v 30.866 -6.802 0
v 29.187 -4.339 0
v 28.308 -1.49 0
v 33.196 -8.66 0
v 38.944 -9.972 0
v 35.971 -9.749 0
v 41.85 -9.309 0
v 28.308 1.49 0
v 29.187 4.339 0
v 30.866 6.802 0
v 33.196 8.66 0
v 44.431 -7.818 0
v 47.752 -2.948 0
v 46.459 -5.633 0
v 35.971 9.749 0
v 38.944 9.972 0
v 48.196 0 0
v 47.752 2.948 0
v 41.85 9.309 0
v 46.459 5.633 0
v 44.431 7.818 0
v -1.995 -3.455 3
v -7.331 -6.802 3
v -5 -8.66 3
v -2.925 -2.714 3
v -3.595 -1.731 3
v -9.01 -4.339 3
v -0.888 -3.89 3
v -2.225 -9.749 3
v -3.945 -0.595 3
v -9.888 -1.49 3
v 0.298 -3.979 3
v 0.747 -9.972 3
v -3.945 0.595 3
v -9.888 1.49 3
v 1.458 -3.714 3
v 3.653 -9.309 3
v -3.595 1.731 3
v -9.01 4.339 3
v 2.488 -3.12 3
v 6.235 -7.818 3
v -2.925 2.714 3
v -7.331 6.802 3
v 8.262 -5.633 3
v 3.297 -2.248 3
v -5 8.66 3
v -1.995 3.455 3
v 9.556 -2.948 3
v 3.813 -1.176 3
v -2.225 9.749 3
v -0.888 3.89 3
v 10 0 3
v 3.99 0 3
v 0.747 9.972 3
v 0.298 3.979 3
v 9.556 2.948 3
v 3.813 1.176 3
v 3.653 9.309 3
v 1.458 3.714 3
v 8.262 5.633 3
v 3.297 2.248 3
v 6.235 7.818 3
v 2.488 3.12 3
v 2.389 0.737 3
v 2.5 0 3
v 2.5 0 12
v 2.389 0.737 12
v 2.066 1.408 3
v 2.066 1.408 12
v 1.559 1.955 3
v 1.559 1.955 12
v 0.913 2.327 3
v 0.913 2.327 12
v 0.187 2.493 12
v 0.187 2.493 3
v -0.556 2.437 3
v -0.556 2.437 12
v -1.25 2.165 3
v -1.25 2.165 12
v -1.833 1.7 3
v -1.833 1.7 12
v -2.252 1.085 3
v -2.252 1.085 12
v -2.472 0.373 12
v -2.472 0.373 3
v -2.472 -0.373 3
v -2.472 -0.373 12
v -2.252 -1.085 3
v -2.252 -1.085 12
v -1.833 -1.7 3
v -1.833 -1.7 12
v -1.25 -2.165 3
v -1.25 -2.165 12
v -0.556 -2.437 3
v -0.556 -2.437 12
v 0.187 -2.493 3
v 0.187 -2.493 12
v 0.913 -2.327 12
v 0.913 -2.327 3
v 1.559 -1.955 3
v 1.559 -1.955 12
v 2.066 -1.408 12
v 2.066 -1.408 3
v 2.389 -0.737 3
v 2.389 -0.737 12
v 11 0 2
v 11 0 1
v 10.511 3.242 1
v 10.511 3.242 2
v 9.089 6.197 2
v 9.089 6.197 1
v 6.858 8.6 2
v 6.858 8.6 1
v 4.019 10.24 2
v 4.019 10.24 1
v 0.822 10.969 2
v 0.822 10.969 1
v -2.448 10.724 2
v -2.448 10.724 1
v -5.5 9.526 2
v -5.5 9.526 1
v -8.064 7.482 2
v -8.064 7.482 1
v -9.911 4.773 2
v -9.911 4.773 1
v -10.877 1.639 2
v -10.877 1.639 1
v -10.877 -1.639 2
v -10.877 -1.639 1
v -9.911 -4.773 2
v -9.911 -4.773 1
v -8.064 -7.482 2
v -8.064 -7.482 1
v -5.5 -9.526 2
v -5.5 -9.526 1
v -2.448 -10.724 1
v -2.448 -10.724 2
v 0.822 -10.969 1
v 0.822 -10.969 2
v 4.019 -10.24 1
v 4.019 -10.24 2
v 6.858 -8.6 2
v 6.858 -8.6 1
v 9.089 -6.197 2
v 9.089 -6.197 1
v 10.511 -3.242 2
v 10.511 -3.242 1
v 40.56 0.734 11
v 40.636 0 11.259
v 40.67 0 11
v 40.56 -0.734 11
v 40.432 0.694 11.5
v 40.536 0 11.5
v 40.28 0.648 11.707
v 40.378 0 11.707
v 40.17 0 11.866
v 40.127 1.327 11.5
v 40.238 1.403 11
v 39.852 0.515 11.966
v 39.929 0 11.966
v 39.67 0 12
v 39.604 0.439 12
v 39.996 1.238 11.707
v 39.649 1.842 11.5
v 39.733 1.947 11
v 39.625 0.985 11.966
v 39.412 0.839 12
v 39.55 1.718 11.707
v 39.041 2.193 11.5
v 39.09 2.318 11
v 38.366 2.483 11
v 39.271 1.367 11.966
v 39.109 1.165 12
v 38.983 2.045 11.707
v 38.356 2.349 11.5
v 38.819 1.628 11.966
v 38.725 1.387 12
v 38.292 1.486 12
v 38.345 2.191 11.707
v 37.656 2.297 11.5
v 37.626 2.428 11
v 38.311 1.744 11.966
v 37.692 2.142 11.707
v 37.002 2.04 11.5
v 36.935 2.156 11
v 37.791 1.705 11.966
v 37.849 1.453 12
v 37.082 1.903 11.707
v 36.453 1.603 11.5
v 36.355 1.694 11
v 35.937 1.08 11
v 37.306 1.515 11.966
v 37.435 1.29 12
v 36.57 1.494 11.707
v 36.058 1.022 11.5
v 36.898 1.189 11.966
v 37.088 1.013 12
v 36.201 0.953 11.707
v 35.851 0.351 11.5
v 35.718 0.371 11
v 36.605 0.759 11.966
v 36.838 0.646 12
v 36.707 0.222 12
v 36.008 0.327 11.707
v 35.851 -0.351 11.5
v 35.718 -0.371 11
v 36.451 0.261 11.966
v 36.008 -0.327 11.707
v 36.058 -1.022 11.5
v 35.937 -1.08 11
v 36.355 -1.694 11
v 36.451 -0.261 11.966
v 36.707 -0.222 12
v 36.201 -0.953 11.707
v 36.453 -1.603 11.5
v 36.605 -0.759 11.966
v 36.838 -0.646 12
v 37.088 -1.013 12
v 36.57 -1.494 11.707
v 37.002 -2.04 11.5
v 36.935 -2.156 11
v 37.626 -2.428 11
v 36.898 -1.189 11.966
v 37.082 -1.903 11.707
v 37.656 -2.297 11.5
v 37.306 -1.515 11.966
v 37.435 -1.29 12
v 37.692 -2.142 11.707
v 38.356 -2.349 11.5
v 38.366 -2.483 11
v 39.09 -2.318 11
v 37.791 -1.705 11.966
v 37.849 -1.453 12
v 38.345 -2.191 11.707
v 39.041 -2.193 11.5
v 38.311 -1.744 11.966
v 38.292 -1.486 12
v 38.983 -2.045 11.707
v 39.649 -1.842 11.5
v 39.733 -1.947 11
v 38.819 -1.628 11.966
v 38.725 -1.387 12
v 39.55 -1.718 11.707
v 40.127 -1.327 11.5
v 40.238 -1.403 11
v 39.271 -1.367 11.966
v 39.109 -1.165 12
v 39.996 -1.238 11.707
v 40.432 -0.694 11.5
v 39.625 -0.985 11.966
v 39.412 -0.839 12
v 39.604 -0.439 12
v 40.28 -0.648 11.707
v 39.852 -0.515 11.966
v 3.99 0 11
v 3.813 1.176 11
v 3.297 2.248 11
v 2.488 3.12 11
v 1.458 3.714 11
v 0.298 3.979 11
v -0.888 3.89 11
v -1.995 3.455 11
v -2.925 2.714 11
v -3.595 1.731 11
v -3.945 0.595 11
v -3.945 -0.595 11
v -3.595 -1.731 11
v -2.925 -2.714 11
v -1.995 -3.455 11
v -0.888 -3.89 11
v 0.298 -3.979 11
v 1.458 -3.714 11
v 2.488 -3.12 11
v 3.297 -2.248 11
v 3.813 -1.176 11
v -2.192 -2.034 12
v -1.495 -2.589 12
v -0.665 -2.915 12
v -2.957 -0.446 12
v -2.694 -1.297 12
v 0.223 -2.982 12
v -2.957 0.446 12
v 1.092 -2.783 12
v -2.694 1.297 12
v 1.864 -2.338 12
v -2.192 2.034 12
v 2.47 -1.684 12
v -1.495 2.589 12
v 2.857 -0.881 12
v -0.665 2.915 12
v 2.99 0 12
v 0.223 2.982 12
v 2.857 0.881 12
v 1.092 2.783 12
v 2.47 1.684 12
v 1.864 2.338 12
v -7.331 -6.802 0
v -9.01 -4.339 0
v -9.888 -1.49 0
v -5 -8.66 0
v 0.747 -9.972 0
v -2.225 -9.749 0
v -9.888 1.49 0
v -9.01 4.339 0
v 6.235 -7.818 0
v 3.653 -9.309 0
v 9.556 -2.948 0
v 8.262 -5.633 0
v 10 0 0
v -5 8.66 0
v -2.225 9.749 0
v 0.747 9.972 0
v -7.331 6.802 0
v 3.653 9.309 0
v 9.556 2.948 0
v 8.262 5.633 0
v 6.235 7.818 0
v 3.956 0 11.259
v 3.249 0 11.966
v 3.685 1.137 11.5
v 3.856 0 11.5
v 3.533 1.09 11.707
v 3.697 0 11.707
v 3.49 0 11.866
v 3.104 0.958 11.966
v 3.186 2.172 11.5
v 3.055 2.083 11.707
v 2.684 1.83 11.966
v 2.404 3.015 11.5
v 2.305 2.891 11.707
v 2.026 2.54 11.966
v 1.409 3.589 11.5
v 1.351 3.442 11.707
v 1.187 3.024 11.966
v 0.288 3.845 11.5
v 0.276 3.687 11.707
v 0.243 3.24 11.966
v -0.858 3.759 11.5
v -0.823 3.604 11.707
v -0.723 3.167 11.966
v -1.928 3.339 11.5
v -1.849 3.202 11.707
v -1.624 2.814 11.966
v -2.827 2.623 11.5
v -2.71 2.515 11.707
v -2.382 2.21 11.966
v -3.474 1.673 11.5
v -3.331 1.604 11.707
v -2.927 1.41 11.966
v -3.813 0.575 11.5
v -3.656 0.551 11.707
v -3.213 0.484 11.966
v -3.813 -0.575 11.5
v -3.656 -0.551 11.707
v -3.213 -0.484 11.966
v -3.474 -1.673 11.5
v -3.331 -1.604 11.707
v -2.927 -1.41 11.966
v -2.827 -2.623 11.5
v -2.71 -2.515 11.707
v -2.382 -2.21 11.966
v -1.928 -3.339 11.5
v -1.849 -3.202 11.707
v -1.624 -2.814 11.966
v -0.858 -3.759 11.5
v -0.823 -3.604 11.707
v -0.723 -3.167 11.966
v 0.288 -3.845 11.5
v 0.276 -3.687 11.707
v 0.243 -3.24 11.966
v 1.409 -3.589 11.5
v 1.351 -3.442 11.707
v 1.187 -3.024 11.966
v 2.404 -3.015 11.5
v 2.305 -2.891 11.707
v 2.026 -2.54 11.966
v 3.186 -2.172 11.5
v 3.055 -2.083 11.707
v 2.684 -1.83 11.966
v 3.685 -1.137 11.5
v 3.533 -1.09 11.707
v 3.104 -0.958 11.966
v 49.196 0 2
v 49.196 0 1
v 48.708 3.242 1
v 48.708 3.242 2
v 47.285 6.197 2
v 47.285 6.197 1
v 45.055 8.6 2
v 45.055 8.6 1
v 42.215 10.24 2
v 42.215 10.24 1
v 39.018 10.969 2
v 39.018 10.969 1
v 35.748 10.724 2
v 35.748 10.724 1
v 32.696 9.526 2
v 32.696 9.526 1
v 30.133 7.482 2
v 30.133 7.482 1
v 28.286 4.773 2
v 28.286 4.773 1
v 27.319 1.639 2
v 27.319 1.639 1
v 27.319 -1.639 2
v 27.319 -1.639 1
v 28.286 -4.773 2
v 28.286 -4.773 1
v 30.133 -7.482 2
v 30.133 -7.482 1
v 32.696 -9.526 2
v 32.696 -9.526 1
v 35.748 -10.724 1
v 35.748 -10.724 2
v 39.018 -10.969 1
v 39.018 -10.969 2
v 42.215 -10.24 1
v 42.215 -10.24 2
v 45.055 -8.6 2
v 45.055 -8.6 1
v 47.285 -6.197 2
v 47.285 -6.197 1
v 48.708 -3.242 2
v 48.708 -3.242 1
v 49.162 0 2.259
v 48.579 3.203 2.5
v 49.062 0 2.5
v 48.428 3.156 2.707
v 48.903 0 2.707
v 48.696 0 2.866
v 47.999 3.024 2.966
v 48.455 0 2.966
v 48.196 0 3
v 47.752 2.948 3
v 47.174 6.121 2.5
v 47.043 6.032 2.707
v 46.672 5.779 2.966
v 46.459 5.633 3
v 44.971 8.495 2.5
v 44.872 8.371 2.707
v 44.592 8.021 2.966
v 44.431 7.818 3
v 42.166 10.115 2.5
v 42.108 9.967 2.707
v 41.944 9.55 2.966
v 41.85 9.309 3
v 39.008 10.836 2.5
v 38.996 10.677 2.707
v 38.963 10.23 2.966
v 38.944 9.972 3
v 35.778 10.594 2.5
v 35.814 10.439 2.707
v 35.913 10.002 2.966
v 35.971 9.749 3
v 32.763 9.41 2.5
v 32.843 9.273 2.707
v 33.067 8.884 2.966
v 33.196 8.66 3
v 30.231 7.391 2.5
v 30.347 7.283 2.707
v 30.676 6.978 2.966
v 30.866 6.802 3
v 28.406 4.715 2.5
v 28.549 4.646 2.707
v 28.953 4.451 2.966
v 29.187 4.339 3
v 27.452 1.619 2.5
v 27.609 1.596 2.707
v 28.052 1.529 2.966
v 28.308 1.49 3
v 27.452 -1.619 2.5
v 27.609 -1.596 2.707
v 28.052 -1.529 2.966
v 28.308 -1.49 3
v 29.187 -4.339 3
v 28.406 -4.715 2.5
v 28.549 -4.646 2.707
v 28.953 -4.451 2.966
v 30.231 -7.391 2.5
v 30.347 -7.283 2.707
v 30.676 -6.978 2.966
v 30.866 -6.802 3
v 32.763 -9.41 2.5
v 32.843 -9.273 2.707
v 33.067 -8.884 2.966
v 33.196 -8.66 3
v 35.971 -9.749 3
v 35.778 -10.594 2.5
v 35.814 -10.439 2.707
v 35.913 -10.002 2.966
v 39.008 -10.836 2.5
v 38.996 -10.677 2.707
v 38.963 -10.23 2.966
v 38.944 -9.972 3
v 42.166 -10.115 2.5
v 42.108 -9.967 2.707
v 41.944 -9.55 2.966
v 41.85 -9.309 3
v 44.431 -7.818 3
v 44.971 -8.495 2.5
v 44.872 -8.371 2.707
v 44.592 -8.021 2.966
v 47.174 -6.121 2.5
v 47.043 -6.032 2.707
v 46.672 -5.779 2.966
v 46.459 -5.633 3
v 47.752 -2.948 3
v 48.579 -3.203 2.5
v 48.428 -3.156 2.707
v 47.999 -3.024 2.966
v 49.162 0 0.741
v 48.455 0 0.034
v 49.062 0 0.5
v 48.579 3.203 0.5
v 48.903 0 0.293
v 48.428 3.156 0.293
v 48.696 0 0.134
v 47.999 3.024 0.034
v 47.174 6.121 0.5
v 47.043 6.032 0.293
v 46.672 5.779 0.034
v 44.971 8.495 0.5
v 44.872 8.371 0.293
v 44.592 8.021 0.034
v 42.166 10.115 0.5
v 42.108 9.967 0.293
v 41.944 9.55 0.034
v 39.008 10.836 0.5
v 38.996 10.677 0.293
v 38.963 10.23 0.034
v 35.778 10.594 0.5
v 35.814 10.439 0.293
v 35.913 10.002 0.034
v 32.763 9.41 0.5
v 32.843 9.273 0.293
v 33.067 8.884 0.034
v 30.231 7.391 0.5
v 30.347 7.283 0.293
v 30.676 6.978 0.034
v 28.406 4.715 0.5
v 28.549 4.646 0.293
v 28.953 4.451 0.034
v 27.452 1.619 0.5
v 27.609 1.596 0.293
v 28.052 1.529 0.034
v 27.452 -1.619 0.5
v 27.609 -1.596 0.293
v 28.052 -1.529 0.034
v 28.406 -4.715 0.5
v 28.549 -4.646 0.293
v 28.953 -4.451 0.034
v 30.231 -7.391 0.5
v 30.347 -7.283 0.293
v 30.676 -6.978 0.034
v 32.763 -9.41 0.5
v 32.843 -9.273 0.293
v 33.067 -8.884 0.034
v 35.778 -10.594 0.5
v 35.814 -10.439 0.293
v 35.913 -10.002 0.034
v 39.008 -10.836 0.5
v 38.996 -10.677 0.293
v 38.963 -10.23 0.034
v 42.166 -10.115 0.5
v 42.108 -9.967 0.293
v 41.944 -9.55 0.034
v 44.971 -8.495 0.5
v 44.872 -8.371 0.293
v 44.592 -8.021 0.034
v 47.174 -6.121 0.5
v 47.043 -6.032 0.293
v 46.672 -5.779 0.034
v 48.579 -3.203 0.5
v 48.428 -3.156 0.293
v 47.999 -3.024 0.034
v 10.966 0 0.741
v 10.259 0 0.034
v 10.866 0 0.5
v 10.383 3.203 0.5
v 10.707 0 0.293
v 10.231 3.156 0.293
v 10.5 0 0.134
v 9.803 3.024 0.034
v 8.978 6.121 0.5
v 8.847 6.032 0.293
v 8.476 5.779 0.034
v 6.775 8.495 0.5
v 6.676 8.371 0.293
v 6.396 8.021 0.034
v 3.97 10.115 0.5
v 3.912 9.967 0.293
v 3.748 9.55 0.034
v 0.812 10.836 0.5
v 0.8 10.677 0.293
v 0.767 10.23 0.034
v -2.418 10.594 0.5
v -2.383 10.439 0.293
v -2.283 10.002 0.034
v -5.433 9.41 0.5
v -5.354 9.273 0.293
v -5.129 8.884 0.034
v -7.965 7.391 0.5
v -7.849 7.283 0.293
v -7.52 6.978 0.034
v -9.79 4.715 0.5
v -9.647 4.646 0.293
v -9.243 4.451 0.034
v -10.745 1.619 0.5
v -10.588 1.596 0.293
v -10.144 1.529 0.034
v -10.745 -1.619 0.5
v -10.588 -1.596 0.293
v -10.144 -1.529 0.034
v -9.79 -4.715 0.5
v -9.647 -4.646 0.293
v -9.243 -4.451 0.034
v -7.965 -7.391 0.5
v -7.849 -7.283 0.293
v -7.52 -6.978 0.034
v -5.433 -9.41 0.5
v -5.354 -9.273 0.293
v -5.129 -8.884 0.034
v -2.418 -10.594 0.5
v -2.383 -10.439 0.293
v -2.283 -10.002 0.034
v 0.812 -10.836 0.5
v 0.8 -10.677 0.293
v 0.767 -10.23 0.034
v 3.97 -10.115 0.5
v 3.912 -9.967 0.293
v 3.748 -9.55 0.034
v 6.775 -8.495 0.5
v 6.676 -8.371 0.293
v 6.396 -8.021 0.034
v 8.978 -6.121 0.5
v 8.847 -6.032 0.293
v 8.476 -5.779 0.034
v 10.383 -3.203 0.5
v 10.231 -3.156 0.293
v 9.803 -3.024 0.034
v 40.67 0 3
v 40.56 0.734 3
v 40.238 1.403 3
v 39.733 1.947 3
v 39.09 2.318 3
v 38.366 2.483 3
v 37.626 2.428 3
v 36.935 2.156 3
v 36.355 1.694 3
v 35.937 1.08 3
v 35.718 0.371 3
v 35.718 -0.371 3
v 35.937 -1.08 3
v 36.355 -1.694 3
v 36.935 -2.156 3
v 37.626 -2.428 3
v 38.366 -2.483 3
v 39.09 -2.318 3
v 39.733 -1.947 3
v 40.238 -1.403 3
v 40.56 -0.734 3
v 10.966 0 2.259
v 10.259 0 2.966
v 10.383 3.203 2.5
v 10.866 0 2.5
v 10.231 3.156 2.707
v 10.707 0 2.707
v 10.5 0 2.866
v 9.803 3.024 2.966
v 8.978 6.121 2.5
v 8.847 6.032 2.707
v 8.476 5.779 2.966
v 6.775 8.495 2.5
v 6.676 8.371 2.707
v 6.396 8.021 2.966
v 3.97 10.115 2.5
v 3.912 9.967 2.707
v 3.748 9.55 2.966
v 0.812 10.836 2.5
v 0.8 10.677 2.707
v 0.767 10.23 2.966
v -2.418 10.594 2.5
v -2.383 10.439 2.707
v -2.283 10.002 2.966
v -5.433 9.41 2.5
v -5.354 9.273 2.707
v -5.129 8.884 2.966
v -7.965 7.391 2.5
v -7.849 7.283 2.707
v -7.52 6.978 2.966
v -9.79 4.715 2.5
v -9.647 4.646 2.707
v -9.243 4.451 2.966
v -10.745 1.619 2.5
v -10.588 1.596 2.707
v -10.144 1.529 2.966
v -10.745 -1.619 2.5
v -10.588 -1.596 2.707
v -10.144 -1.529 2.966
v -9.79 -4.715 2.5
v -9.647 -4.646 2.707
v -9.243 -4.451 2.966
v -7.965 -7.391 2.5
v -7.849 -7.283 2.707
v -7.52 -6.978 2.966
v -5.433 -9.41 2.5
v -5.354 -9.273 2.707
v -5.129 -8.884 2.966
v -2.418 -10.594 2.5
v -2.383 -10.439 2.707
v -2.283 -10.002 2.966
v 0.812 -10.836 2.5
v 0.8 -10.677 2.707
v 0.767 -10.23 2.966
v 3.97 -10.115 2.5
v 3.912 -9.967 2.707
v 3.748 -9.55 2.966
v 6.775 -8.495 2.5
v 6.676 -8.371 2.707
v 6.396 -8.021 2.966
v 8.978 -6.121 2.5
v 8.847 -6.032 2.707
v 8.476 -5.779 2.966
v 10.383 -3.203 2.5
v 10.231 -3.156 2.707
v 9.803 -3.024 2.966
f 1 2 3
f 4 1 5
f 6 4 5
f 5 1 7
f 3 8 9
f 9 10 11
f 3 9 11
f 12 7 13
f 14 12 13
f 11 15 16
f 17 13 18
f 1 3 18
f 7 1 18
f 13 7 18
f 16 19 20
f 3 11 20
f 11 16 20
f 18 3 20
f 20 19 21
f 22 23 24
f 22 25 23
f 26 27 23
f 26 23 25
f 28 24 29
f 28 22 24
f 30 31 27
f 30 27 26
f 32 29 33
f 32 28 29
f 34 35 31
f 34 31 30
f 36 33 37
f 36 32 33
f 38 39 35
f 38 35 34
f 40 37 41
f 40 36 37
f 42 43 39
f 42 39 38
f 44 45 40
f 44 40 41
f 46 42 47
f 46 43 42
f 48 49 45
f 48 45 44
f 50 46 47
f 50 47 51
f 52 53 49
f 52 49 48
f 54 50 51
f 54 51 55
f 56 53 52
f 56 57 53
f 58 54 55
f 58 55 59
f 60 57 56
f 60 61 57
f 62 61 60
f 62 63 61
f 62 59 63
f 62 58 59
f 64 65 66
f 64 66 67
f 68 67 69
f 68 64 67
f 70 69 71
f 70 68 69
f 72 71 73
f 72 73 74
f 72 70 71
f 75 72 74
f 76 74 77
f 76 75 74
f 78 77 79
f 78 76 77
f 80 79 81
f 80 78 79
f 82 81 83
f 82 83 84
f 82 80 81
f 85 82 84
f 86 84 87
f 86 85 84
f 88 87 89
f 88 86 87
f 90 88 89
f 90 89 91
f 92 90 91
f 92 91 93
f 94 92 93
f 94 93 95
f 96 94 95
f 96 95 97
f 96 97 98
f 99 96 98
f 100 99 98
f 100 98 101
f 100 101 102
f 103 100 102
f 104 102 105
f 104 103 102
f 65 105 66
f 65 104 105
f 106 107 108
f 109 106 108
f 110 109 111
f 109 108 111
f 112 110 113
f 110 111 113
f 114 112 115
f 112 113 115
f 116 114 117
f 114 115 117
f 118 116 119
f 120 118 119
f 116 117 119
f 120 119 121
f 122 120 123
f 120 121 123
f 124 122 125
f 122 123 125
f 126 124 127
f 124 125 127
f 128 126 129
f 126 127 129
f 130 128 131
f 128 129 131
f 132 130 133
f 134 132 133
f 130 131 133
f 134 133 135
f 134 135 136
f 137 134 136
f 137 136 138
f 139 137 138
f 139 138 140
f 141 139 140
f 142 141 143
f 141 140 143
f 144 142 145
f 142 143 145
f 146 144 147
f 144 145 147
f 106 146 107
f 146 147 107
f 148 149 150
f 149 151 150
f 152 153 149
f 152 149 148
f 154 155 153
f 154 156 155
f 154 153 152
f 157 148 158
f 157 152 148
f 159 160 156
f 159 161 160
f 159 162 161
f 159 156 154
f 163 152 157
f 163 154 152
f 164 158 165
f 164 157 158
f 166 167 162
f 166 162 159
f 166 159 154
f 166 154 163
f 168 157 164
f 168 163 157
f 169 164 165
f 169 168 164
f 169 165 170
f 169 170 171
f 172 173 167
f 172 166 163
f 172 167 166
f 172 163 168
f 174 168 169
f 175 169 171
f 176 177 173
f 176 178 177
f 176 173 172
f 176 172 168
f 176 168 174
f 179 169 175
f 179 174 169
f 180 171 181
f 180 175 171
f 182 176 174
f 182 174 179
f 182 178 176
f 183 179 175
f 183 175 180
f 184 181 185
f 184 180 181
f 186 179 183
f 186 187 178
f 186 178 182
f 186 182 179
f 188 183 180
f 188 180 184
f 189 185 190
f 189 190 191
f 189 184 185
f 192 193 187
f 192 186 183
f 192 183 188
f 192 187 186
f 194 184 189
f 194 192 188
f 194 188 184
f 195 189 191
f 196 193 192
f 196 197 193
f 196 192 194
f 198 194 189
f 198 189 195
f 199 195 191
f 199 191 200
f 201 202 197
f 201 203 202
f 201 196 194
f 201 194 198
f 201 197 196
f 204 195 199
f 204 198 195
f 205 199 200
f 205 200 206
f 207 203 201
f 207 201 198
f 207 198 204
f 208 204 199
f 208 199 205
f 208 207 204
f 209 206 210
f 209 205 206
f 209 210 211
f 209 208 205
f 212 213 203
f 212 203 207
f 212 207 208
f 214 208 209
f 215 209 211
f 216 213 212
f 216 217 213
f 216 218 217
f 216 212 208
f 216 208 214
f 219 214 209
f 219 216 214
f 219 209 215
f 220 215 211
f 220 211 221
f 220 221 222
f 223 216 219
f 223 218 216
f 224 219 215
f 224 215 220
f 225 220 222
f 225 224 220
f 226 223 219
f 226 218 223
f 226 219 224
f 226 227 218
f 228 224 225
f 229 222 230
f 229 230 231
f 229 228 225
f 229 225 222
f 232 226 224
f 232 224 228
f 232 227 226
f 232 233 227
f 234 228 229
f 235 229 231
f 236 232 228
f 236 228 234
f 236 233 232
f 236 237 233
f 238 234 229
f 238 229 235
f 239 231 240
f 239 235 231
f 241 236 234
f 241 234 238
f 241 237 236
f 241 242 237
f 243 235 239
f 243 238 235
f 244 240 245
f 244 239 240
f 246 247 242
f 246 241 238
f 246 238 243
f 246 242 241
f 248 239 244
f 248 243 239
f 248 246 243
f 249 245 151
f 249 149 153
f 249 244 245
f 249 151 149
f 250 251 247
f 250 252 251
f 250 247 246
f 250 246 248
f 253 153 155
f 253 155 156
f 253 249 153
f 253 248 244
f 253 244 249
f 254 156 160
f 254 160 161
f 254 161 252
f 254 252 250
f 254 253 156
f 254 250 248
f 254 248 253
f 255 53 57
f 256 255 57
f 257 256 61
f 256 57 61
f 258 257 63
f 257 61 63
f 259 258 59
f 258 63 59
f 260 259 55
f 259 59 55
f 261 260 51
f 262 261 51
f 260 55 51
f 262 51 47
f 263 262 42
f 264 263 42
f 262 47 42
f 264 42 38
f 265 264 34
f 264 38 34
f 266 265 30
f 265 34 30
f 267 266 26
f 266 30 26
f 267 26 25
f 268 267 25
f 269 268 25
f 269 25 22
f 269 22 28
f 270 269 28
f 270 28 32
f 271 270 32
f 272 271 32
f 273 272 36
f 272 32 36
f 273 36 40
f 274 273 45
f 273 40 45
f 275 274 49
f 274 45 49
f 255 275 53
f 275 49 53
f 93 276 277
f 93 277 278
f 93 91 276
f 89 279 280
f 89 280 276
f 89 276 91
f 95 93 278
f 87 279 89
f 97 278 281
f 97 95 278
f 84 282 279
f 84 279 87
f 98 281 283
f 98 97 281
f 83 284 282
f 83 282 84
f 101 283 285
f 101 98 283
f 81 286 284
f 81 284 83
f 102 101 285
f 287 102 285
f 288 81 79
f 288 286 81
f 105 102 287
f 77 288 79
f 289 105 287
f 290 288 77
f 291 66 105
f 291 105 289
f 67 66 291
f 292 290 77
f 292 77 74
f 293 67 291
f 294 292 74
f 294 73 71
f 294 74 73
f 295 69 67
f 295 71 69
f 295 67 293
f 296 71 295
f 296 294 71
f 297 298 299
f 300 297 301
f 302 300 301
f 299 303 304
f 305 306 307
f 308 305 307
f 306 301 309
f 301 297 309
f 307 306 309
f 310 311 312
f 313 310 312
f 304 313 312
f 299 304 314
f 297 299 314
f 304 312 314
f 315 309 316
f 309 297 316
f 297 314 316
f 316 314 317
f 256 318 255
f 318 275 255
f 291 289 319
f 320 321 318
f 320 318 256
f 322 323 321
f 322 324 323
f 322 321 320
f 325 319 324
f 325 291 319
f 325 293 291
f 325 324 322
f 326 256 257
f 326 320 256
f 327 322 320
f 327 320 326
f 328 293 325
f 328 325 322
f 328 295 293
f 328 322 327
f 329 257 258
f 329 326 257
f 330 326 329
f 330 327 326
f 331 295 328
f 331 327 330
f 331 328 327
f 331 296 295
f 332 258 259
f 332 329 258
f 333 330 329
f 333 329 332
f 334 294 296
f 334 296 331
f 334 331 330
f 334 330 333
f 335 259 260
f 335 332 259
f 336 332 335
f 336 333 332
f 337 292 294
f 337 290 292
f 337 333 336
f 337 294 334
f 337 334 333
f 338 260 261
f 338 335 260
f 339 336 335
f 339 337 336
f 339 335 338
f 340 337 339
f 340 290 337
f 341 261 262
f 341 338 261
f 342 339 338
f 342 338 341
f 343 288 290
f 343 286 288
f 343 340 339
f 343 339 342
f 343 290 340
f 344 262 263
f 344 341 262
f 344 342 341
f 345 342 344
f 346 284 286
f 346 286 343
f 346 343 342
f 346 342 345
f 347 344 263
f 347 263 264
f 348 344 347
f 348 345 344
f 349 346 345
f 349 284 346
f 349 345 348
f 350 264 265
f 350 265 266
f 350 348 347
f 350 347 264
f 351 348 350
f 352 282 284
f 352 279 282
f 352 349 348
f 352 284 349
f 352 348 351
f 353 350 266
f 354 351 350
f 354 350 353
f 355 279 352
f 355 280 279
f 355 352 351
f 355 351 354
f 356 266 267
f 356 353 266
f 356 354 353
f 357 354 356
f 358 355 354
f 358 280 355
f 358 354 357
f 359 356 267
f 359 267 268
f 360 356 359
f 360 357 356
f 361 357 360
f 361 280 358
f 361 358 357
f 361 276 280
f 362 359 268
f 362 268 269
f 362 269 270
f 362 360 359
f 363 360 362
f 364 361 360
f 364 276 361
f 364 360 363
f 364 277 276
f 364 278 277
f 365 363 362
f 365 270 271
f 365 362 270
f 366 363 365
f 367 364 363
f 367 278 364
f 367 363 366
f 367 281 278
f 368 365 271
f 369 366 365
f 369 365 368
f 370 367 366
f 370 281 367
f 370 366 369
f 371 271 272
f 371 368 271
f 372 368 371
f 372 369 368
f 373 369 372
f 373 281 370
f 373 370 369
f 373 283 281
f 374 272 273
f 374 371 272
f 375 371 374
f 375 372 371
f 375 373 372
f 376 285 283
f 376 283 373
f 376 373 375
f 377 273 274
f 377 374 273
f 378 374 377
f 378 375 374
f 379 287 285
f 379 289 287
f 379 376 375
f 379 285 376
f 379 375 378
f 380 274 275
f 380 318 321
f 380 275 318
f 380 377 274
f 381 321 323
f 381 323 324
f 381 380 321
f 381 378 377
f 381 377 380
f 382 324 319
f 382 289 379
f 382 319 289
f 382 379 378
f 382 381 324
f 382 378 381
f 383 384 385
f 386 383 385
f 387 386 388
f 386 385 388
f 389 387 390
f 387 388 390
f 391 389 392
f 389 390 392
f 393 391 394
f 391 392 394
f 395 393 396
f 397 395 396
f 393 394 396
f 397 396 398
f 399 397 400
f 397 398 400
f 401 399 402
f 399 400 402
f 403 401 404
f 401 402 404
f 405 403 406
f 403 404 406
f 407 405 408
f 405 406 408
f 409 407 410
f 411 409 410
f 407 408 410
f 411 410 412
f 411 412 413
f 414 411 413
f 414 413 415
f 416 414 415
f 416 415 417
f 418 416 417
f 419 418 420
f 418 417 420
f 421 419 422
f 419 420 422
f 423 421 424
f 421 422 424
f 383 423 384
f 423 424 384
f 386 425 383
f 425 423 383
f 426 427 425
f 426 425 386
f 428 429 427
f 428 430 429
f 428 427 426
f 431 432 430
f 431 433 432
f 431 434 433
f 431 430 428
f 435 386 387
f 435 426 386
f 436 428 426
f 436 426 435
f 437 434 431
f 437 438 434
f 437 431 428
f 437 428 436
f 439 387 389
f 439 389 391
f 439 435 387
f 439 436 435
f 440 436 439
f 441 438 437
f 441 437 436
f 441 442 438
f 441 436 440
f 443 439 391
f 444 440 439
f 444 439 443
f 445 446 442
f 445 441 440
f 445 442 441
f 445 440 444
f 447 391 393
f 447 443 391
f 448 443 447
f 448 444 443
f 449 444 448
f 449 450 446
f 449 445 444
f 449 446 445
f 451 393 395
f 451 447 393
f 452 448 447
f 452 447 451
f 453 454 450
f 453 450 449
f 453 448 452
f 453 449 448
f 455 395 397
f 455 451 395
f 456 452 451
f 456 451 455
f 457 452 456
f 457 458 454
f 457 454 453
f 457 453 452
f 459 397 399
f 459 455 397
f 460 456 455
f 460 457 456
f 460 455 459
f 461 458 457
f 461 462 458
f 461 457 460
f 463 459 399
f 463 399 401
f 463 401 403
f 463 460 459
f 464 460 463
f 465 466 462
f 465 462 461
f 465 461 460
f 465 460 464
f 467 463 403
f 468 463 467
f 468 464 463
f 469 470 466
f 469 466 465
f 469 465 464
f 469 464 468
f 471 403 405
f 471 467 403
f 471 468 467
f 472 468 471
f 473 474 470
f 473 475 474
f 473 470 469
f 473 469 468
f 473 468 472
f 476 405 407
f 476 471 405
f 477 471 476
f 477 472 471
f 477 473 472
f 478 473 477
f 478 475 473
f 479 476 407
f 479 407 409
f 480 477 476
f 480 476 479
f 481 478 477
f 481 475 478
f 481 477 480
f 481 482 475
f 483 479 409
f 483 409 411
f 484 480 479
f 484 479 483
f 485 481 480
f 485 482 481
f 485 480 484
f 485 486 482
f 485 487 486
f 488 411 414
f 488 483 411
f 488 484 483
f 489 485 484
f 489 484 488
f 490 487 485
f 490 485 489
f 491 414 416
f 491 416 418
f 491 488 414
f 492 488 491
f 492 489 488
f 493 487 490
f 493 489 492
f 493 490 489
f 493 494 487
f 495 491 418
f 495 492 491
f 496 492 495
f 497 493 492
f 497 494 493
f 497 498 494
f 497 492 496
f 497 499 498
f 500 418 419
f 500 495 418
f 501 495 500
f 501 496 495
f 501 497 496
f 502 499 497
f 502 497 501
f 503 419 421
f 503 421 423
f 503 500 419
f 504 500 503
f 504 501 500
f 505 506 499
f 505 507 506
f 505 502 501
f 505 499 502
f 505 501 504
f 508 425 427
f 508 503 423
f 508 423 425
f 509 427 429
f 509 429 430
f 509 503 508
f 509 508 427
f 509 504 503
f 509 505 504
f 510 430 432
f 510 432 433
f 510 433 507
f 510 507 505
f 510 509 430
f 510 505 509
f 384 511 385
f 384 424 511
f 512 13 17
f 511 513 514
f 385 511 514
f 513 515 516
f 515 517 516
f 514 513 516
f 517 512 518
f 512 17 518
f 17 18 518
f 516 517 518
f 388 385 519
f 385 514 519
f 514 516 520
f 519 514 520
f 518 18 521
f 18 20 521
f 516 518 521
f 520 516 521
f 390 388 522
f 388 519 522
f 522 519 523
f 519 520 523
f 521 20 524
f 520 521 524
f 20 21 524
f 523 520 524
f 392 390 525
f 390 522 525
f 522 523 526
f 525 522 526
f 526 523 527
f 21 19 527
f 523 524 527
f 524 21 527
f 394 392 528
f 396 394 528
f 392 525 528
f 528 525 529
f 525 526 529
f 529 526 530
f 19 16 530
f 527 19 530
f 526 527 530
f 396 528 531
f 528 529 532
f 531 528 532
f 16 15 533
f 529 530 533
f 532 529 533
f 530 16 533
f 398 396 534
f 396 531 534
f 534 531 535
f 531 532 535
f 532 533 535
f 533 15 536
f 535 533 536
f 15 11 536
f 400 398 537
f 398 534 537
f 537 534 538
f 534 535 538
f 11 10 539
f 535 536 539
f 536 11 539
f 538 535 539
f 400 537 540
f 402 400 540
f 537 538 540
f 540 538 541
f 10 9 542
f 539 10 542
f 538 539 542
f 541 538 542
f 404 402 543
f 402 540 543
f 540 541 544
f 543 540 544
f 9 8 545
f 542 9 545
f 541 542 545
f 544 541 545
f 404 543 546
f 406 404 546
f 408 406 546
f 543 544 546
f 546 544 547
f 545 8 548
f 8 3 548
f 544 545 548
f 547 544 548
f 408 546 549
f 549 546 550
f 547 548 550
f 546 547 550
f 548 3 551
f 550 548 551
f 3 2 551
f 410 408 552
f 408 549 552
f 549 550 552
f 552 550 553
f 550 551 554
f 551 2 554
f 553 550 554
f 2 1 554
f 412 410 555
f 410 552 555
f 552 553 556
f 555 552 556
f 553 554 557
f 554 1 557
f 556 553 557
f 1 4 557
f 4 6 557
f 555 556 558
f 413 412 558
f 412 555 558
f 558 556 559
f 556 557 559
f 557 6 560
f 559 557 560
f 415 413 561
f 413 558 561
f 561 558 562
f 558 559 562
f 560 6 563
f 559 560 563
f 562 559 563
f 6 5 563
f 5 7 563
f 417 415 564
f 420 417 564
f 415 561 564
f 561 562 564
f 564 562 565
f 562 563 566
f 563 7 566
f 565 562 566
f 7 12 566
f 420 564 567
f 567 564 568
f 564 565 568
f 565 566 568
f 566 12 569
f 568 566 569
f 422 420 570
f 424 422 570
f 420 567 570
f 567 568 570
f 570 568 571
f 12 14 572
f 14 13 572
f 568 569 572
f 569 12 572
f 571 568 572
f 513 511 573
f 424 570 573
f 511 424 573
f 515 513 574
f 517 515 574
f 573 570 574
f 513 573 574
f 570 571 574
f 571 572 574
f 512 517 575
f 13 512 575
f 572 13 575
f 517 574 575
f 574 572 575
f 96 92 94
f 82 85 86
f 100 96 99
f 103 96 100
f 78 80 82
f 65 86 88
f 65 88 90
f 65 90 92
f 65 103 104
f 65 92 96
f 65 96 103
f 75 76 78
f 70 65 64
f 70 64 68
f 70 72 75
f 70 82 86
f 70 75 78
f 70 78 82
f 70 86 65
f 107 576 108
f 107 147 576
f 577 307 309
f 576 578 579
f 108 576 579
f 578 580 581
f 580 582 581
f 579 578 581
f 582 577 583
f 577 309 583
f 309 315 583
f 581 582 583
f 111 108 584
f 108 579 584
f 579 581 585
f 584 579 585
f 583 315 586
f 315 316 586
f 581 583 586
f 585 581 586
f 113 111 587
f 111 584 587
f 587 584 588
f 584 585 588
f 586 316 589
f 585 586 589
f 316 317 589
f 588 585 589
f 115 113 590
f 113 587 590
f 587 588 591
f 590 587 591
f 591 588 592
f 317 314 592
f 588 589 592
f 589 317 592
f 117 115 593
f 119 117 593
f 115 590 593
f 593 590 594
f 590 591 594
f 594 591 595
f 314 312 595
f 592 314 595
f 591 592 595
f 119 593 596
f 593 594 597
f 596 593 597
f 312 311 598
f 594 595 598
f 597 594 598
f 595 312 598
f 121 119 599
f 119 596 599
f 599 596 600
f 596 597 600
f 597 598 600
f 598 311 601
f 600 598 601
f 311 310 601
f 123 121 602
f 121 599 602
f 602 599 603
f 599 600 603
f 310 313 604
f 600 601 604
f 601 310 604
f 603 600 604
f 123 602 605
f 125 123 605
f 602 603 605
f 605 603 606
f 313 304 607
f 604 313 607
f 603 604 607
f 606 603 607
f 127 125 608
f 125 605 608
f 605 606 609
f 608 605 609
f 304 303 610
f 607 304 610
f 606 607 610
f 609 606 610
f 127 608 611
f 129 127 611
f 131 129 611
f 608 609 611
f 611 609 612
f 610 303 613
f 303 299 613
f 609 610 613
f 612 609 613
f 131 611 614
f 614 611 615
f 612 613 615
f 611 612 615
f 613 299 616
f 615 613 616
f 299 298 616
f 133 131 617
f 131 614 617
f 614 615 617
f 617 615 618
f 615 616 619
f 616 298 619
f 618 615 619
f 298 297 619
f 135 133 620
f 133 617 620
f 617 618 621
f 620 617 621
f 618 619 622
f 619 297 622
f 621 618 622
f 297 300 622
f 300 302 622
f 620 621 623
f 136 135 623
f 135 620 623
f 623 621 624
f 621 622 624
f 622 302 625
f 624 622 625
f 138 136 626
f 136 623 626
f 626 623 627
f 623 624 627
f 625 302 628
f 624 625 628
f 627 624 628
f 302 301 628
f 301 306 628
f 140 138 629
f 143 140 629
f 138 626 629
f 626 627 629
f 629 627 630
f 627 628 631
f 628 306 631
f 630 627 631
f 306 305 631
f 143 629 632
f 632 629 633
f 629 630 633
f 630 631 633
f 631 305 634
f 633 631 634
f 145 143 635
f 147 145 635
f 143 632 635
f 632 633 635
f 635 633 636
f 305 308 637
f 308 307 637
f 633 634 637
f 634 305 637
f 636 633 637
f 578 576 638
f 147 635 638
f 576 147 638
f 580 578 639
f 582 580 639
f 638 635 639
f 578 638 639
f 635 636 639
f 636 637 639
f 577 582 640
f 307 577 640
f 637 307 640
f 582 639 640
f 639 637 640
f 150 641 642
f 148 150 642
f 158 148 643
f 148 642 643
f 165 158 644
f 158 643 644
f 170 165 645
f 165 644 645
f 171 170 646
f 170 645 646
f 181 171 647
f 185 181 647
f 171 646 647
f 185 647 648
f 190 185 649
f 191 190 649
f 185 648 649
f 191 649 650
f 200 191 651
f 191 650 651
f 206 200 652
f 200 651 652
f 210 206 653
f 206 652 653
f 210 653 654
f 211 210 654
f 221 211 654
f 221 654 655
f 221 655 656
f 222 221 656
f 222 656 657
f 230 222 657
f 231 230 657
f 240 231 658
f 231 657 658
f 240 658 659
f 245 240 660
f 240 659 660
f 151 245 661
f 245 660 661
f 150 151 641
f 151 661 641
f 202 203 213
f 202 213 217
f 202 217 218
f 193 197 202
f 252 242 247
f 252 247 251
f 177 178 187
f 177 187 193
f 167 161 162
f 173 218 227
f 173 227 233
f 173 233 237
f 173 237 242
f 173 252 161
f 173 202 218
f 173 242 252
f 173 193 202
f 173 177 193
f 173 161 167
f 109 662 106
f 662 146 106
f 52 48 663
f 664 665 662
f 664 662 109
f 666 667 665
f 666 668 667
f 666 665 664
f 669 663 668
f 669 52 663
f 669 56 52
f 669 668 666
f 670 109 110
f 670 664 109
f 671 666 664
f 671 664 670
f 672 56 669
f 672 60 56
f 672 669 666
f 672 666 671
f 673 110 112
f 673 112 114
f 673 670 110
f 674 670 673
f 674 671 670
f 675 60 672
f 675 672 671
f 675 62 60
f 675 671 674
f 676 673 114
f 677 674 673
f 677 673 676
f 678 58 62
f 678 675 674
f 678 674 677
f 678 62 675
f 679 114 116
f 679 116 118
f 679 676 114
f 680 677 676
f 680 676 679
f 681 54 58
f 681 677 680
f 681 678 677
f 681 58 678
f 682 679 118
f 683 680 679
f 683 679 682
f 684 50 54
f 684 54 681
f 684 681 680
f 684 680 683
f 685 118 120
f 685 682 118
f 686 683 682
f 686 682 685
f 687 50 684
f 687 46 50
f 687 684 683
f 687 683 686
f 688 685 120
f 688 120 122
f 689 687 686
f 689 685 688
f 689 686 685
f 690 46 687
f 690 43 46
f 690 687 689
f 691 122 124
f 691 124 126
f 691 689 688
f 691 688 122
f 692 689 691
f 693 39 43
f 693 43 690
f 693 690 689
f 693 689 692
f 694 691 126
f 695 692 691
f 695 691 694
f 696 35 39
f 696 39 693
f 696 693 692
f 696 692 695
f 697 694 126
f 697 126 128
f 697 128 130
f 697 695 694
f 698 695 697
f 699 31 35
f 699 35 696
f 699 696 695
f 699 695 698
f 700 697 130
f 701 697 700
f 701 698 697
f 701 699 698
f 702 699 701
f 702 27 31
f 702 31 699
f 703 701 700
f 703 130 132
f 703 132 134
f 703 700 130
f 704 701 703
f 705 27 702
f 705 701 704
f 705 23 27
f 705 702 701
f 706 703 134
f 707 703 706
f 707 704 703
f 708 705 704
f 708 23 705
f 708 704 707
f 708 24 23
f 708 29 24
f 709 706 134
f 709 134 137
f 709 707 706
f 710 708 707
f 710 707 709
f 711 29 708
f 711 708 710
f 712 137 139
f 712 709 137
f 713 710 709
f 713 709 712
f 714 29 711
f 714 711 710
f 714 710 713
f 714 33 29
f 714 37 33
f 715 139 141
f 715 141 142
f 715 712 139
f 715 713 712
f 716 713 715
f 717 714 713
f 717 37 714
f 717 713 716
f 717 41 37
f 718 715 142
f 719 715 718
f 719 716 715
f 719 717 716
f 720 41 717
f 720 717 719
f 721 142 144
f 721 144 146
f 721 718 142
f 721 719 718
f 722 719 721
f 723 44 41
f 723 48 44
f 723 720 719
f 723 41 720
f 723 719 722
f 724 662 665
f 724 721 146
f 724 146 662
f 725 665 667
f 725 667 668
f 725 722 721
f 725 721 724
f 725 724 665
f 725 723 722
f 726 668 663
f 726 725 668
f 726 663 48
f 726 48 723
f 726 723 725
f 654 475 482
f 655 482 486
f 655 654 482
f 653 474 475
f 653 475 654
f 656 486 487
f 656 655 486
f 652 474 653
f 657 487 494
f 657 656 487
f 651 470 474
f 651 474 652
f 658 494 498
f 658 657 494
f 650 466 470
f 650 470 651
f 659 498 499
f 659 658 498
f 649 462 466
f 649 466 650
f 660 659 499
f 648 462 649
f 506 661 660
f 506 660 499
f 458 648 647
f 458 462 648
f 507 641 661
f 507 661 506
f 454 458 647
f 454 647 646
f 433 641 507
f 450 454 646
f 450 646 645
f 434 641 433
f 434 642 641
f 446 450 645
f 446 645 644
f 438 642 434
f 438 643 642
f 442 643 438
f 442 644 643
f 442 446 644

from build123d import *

# Parameters (mm, degrees)
F0_R     = 11
F1_DEPTH = 3
F3_R     = 3.99
F3_R_2   = 2.5
F4_DEPTH = 9
F3_R_3   = 2.49
F5_R     = 1
F5_2_R   = 1


with BuildPart() as f1:
    # F0 (on Top) → F1 (new body)
    with BuildSketch(Plane.XY):
        with Locations((38.1962135434, 0)):
            Circle(F0_R)
    extrude(amount=F1_DEPTH)

    # F3 (on mid) → F4, piece 2 (join)
    with BuildSketch(Plane.XY.offset(3)):
        with Locations((38.1804183125, 0)):
            Circle(F3_R_3)
    extrude(amount=F4_DEPTH)

    # F5#2
    f5_2_edges = [f1.edges().sort_by_distance(p)[0] for p in [
        (27.196214, 0, 3),
        (49.196214, 0, 1.5),
        (27.196214, 0, 0),
        (35.690418, 0, 12),
    ]]
    fillet(f5_2_edges, radius=F5_2_R)


with BuildPart() as f1b:
    # F0 (on Top) → F1, piece 2 (new body)
    with BuildSketch(Plane.XY):
        Circle(F0_R)
    extrude(amount=F1_DEPTH)

    # F3 (on mid) → F4 (join)
    with BuildSketch(Plane.XY.offset(3)):
        Circle(F3_R)
        Circle(F3_R_2, mode=Mode.SUBTRACT)
    extrude(amount=F4_DEPTH)

    # F5
    f5_edges = [f1b.edges().sort_by_distance(p)[0] for p in [
        (-11, 0, 0),
        (-11, 0, 3),
        (-3.99, 0, 12),
    ]]
    fillet(f5_edges, radius=F5_R)


solid = Compound([f1.part, f1b.part])
